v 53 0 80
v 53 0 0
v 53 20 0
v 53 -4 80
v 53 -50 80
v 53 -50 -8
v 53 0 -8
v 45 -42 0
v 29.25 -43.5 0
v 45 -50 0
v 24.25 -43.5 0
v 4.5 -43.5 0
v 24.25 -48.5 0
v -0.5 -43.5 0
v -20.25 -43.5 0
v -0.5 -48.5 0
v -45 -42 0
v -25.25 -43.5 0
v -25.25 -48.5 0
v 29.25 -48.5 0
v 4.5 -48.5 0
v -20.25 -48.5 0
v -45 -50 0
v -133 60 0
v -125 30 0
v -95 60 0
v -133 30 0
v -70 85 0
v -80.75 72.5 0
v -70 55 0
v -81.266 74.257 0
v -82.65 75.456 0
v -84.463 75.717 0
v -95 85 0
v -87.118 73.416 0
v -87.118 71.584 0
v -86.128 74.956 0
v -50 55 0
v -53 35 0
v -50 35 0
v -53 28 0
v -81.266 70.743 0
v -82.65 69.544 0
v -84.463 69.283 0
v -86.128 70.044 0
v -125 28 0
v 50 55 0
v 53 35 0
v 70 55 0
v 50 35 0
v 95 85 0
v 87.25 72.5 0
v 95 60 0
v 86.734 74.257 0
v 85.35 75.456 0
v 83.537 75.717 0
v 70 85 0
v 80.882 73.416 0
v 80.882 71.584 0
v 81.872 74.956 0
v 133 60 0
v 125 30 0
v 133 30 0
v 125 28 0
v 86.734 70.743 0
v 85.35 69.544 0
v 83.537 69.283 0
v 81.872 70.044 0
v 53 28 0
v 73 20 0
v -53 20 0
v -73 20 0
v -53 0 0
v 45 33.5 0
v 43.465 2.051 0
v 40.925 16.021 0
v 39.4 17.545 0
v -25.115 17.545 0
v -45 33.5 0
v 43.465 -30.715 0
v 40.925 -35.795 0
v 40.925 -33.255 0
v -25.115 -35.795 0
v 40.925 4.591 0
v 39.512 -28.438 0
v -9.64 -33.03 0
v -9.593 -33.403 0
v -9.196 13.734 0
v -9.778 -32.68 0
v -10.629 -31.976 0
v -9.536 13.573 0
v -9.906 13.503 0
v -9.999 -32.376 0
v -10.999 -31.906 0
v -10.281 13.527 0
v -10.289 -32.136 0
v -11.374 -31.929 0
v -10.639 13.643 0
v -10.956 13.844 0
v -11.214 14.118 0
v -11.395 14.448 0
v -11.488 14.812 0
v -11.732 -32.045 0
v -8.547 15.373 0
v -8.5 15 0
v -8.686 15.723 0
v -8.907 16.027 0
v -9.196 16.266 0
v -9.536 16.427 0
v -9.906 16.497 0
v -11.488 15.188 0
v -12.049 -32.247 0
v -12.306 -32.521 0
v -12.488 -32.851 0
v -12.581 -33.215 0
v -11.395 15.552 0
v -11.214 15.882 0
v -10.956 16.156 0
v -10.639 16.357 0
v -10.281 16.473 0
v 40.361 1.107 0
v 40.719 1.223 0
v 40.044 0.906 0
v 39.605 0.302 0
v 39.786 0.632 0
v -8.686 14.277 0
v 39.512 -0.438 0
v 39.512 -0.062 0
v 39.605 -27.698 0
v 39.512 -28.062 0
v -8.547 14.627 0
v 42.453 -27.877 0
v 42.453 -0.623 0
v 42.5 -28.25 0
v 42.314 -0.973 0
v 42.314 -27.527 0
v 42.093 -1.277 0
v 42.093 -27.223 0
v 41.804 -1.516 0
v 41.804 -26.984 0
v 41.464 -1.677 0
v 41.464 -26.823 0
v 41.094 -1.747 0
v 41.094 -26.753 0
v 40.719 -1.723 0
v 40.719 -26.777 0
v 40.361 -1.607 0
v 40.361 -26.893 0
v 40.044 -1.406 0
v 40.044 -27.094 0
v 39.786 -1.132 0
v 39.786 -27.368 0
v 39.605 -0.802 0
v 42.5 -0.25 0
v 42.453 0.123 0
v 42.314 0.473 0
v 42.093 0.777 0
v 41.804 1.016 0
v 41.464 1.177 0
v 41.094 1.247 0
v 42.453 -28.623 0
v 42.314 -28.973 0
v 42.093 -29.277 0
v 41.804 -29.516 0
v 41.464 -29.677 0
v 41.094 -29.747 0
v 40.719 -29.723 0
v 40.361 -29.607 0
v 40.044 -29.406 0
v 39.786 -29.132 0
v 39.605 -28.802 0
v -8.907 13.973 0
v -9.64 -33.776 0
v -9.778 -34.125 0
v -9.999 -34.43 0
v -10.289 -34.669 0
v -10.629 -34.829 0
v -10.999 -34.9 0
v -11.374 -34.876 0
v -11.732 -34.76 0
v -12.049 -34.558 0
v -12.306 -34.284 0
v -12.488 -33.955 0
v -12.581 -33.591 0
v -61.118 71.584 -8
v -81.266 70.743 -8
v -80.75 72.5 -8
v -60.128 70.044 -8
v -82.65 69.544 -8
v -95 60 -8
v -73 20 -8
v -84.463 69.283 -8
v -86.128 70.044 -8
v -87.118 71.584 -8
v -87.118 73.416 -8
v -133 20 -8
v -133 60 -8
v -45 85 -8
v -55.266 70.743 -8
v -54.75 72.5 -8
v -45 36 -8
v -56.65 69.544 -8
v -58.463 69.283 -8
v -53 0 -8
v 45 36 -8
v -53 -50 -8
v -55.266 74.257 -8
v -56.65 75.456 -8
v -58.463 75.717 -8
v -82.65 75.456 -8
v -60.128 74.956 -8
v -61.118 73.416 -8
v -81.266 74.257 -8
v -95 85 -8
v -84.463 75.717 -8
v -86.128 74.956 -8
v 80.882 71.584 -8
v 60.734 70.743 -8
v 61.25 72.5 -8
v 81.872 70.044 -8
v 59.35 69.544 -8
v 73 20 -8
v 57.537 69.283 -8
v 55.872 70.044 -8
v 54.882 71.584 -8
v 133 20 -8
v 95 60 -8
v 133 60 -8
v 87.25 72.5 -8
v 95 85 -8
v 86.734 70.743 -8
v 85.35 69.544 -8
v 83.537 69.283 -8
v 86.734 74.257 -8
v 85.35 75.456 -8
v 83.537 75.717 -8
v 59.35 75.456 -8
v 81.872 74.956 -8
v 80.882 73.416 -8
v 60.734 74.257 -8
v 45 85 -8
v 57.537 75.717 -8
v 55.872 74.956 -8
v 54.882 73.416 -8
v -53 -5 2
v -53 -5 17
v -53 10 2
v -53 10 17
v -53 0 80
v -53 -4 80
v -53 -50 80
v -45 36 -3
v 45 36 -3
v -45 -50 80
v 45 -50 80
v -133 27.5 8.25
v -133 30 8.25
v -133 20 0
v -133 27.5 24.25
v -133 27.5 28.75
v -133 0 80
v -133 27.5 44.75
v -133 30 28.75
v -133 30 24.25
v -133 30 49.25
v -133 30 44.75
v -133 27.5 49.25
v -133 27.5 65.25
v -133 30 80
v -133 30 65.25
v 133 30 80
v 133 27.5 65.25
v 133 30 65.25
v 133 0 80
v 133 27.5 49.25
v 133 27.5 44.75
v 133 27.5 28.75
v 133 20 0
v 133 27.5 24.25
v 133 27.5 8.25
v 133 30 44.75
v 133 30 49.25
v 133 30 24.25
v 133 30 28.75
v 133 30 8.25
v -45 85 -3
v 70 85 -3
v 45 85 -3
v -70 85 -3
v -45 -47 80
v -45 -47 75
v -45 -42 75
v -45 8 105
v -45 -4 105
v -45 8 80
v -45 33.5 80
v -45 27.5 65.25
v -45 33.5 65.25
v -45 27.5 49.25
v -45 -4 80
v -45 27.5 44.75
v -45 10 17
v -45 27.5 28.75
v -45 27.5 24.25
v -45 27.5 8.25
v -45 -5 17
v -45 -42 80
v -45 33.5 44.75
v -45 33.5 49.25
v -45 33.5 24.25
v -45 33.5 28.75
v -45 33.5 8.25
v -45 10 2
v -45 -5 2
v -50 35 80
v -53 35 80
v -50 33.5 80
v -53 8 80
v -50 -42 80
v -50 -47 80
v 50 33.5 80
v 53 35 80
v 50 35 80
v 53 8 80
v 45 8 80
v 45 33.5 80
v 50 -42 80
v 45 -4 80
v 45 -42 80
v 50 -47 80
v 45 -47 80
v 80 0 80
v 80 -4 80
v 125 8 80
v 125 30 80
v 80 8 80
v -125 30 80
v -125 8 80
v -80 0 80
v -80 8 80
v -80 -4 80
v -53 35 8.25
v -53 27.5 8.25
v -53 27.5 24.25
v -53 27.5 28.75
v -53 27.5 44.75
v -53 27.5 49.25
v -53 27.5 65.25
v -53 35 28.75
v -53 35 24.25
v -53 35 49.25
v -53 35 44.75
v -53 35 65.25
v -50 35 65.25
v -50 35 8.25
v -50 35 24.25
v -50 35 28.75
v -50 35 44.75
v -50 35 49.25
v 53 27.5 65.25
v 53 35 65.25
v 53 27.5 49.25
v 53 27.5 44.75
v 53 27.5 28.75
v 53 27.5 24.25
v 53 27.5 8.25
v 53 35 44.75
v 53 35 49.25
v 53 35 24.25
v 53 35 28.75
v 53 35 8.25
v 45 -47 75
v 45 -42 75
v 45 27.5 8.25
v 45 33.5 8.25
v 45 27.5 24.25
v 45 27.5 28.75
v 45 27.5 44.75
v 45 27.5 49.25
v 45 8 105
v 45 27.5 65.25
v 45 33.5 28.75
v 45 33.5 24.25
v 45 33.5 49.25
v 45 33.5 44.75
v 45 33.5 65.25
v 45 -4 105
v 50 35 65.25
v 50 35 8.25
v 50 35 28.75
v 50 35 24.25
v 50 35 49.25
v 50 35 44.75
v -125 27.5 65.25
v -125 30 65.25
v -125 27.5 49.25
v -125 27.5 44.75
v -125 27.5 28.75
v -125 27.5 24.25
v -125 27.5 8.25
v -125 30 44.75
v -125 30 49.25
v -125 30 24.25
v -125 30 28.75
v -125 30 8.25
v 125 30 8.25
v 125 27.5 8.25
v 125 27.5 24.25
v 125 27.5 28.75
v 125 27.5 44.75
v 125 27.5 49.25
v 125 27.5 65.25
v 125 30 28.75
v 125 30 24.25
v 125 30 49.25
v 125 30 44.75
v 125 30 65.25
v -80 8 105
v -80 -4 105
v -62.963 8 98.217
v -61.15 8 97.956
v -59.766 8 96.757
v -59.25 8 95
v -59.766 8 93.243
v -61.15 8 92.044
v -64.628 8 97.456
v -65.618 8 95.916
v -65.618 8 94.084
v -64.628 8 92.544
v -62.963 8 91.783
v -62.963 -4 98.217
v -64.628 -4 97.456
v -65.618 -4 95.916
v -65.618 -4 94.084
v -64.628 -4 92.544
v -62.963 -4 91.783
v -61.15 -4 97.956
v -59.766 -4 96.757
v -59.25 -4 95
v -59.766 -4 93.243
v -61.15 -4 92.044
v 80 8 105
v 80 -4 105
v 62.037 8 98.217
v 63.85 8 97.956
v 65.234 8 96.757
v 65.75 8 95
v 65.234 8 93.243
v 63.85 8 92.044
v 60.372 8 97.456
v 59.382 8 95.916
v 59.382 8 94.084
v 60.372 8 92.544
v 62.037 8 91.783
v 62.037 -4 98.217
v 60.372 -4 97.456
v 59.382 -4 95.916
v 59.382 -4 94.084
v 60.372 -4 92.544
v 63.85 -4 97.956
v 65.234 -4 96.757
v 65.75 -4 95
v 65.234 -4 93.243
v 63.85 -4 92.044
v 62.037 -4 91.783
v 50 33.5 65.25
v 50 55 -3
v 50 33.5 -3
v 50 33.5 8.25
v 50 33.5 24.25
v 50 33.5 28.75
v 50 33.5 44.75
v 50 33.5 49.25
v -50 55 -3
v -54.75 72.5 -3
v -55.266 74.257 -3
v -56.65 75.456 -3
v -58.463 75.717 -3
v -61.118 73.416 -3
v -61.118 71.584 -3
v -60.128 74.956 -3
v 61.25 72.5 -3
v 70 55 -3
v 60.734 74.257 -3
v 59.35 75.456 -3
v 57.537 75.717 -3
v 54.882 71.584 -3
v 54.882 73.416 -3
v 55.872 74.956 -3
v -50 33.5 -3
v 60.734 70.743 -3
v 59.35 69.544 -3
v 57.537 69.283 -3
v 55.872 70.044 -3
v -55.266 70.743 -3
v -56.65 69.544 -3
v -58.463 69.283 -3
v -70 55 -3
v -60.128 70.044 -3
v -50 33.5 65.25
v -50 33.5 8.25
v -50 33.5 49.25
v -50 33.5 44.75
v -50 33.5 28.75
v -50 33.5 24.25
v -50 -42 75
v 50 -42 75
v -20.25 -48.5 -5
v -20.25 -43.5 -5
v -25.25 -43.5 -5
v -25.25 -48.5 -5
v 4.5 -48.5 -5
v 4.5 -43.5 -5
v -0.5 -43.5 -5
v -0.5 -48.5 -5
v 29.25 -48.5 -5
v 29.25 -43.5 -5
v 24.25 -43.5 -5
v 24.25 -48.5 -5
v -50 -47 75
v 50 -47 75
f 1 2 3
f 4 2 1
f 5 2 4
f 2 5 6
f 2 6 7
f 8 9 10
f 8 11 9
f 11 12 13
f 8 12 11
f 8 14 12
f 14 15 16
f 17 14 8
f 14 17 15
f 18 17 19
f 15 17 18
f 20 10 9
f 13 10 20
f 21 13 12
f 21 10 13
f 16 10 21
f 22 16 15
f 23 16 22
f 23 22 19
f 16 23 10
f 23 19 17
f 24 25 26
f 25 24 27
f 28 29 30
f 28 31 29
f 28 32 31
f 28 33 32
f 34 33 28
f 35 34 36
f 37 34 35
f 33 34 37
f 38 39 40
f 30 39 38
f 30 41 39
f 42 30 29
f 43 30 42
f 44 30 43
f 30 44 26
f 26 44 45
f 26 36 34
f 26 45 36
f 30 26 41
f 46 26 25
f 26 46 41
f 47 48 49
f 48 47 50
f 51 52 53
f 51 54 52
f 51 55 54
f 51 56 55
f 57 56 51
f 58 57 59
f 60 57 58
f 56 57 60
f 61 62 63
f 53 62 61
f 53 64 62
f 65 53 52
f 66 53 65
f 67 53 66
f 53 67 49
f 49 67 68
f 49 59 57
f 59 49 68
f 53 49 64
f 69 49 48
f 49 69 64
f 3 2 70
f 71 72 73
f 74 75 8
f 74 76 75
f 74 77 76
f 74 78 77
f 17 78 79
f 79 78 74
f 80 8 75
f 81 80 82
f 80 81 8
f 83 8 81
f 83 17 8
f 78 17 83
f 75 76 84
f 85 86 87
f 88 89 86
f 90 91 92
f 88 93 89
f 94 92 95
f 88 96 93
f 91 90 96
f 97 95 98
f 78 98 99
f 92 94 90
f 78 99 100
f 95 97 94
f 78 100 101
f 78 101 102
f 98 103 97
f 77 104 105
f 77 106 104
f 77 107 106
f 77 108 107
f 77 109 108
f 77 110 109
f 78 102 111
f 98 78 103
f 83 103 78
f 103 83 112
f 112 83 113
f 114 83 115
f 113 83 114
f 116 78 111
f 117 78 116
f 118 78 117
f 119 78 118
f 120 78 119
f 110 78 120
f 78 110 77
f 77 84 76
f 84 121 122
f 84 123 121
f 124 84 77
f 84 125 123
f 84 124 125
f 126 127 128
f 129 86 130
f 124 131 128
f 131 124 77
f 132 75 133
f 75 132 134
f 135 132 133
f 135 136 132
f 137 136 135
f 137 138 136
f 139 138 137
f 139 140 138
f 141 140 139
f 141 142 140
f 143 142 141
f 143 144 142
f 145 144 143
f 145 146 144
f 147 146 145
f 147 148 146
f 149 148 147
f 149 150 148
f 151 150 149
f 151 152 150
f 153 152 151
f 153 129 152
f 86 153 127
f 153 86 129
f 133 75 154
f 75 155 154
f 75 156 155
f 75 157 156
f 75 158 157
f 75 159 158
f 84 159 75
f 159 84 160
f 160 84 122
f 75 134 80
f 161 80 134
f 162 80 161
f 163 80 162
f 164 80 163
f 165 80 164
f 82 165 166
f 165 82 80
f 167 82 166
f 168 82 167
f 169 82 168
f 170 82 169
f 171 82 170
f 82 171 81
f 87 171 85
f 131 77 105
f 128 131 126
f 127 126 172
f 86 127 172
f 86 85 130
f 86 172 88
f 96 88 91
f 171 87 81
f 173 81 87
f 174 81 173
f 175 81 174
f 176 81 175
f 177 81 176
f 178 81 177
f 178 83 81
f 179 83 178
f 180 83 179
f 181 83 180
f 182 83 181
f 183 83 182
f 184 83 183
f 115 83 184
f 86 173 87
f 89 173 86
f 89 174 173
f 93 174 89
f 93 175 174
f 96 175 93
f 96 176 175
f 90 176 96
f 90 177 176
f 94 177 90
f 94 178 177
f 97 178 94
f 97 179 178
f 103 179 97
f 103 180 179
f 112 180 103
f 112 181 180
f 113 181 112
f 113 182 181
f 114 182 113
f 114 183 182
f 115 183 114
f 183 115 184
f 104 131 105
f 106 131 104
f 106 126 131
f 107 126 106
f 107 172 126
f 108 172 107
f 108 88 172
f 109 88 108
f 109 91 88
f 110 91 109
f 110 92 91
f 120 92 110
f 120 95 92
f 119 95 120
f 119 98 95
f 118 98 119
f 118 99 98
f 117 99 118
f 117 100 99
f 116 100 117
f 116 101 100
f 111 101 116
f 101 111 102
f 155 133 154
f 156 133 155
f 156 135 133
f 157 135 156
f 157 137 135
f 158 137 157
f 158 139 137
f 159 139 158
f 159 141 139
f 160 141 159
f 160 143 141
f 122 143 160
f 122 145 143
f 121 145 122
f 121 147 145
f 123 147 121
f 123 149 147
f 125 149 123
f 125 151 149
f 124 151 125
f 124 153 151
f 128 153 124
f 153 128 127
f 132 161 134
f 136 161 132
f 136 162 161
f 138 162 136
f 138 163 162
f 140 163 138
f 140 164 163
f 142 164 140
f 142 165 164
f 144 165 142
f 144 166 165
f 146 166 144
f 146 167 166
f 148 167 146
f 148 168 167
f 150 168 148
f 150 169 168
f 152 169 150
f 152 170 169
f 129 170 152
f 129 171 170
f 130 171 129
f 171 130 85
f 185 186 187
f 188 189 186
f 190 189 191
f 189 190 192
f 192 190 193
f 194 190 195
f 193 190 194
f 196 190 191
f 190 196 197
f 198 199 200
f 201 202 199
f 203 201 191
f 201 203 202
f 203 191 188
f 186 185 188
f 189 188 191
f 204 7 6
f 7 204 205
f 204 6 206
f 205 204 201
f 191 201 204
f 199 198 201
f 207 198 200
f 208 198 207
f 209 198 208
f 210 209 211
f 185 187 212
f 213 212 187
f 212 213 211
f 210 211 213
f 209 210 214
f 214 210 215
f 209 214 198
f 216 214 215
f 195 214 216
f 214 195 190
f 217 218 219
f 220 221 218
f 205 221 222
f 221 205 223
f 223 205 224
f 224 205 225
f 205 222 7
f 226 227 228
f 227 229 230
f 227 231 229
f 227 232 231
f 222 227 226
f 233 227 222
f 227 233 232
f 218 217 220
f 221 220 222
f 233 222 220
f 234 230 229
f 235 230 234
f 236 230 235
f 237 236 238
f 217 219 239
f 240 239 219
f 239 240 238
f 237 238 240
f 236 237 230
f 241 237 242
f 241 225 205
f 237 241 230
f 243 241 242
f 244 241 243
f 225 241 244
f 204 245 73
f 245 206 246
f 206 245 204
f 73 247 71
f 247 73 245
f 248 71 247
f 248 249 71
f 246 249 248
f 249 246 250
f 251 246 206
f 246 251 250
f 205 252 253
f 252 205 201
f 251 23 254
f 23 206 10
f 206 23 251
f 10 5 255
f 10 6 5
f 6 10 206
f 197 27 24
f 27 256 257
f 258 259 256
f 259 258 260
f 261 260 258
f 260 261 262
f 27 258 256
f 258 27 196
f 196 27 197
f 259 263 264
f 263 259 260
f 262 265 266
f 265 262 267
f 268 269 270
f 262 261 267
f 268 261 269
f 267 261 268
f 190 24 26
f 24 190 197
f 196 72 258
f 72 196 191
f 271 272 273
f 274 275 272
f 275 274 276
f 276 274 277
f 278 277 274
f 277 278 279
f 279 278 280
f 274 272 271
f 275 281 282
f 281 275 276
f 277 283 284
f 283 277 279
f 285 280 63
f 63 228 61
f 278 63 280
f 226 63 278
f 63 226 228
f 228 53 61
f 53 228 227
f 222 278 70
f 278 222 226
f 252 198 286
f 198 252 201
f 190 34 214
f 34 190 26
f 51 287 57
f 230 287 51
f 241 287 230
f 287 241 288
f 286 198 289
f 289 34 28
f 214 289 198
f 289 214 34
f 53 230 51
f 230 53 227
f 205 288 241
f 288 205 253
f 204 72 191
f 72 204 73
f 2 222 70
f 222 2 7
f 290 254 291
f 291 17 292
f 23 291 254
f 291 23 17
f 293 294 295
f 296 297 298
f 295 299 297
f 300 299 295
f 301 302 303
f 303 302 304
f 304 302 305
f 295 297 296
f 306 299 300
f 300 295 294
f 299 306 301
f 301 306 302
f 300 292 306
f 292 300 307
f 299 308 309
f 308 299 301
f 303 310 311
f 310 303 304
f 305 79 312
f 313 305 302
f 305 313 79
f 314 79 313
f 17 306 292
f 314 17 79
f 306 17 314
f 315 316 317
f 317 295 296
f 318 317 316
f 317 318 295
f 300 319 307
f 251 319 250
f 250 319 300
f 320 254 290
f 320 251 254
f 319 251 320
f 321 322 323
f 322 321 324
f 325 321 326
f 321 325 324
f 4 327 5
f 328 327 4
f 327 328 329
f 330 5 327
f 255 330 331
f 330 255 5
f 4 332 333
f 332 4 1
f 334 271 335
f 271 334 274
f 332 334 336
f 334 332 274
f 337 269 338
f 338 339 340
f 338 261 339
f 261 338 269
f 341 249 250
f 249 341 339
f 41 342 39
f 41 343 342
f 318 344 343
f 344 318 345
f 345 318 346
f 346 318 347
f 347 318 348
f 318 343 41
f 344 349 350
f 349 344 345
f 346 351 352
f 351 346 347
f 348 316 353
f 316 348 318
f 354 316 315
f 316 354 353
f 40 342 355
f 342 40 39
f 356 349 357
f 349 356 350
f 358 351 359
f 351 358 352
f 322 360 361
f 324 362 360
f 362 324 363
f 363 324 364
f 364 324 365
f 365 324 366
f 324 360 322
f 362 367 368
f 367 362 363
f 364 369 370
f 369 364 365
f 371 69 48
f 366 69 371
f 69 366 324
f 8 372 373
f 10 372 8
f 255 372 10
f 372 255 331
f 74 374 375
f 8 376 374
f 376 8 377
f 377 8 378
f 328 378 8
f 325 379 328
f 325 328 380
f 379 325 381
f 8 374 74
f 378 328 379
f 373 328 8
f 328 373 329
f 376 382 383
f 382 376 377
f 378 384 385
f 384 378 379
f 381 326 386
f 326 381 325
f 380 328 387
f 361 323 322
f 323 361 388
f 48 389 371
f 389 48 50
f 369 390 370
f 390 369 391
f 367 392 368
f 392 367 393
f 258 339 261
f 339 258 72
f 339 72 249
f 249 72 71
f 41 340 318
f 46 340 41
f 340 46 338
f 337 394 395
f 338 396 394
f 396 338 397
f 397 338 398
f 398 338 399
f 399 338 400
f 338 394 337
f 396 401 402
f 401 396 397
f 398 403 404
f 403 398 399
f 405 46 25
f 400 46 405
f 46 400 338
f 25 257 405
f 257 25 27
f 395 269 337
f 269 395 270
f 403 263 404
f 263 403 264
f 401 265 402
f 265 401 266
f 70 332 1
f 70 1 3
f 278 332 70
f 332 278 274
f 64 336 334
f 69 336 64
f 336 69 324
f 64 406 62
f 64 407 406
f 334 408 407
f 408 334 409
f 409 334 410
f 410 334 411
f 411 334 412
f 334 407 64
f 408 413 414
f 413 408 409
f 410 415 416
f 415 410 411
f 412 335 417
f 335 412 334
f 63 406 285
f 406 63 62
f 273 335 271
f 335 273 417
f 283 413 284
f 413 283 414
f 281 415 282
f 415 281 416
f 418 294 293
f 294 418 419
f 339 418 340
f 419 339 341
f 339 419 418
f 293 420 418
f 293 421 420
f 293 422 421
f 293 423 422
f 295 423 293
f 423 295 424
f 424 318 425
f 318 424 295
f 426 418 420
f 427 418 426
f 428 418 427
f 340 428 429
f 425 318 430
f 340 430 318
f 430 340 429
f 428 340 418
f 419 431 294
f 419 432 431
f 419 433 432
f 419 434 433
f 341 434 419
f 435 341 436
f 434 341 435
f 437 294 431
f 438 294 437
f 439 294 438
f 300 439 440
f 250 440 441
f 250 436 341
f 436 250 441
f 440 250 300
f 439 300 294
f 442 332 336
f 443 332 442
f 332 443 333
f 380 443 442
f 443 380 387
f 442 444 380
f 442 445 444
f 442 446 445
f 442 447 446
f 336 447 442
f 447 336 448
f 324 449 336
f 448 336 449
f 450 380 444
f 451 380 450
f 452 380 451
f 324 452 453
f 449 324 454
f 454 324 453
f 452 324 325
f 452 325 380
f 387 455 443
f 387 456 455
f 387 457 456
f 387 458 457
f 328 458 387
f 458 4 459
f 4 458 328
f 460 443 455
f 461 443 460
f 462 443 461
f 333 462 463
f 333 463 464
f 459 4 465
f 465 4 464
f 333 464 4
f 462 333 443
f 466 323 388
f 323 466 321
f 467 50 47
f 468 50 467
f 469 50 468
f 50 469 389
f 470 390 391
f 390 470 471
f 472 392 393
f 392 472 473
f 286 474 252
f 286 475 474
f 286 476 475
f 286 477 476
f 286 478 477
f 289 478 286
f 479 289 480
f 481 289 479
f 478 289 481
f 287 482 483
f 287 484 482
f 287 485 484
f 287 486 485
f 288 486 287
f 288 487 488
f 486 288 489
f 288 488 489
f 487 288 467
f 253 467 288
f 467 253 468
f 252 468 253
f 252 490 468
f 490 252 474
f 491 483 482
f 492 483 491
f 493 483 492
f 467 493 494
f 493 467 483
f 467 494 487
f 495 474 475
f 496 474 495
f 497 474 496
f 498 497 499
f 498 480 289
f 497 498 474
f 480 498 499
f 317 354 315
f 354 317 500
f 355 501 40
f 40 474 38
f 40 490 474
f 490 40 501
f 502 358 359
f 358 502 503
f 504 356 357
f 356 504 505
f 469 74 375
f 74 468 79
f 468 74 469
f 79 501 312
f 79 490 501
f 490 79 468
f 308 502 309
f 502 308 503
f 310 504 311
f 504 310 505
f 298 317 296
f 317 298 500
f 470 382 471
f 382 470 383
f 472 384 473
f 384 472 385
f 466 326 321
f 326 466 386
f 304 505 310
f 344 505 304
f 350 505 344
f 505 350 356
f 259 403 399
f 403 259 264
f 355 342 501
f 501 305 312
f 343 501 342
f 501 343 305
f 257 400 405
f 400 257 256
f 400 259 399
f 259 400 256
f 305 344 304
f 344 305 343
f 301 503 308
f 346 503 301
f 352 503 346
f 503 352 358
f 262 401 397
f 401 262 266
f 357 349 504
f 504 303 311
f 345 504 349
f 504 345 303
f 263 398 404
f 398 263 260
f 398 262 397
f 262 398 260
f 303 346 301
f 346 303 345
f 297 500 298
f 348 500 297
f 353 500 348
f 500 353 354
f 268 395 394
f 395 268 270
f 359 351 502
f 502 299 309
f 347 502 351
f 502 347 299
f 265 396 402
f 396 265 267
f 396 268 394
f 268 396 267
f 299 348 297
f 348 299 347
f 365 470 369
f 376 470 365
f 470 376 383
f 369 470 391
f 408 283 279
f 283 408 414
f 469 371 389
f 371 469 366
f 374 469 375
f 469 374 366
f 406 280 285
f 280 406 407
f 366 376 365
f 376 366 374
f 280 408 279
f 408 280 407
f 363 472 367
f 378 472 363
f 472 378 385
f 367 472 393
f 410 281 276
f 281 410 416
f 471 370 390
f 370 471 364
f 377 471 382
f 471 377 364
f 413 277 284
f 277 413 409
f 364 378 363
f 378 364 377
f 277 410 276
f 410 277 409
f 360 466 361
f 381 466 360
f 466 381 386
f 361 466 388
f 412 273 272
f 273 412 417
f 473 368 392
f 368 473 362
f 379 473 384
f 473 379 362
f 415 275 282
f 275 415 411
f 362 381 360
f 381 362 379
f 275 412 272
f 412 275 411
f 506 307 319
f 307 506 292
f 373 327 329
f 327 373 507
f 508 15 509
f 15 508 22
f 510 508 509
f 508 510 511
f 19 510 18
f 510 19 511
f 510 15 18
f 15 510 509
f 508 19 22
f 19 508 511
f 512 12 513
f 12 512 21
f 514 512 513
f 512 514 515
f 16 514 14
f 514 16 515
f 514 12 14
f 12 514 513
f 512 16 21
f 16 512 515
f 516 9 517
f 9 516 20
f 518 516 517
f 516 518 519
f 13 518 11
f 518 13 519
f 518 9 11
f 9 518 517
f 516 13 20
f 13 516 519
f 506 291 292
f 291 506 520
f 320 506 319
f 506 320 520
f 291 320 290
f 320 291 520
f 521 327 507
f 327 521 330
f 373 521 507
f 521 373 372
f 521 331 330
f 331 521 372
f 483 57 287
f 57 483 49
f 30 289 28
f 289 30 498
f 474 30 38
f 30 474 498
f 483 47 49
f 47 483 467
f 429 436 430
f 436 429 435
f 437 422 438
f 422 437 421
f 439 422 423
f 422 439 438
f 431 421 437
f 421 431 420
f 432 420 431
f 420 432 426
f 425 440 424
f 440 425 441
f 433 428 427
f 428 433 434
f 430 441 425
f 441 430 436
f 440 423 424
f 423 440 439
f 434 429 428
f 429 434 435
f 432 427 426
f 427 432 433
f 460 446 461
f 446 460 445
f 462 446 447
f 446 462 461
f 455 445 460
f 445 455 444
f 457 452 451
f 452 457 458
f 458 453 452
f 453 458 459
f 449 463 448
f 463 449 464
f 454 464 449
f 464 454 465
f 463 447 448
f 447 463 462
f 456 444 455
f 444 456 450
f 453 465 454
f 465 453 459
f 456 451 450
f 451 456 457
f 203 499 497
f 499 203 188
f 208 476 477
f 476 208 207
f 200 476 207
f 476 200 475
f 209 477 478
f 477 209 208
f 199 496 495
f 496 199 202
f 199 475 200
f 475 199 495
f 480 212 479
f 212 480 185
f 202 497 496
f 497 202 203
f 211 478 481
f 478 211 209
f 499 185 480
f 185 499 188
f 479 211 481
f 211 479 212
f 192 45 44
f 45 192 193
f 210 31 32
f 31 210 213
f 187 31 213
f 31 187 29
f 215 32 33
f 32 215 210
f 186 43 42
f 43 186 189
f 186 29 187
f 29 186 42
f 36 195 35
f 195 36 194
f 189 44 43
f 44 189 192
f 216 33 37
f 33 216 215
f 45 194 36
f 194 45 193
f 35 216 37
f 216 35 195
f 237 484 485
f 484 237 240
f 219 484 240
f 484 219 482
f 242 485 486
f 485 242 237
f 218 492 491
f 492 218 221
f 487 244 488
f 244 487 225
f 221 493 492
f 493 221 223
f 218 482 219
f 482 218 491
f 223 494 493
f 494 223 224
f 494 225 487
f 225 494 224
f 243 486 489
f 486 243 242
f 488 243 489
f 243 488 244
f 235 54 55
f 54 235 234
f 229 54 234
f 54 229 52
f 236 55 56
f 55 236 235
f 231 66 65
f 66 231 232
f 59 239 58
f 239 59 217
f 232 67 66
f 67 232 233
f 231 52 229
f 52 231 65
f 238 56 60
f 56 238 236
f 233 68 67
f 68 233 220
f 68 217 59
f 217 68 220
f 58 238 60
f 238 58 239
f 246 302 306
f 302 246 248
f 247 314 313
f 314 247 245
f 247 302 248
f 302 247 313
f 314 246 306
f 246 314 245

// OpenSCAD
//
//if (accessories=="ON"){
//	color([222/255,184/255,135/255]) translate([-50,33.5,-3]) board();
//	translate([-10,15,0]) Arduino(0,0,0);
//} 
//if (mode=="EXPLODED"){
//	baseWCuts();
//	translate([-45,-80,30]) backDoor();
//	translate([0,30,30]) frontPanel();
//	translate([0,30,30]) mirror([1,0,0]) frontPanel();
//}
//if (mode=="ASSEMBLED"){
//	baseWCuts();
//	translate([-45,-50,0]) backDoor();
//	frontPanel();
//	mirror([1,0,0]) frontPanel();
//}
//if (mode=="PARTS"){
//	baseWCuts();
//	translate([280,-10,40]) rotate([270,0,0]) frontPanel();
//	translate([-250,0,10]) rotate([270,0,0]) backDoor();
//	translate([230,-10,40]) mirror([1,0,0]) rotate([270,0,0]) frontPanel();
//
//}

baseWCuts();

//
///////////////////////////////
/* MAIN CONSTRUCTOR MODULES */
//////////////////////////////


//Creates exact front panel with cuts using frontPanelBasic()
module frontPanel(){ 
	difference(){
		translate([-126.5,52,0]) frontPanelBasic();
		baseWCuts();
		translate([-50,33.5,-3]) board();
		translate([65,10,95]) rotate([90,0,0]) cylinder(r=6.5,h=20);
		translate([-58,72.5,-10]) cylinder(r=3.25,h=20);//cuts panel screw holes
		translate([-84,72.5,-10]) cylinder(r=3.25,h=20);
	}
}

//Creates basic block front panel without cuts
module frontPanelBasic(){ 
	union(){
		cube([81.5,8,80]);
		translate([31.5,0,-3]) cube([50,33,8]);
		translate([73.5,-20,-5]) cube([8,20,85]);
		translate([-6.5,-23,0]) cube([8,31,80]);
	}
}

//Creates full base with sides, floor, and all necessary cuts
module baseWCuts(){
	difference(){
		base();
		translate([-50,33.5,-3]) board(); //cuts board
		translate([-10,15,0]) Arduino(0,0,0); //cuts arduino
		translate([-45,-50,0]) backDoor(); //cuts back door
		translate([-70,55,-3]) cube([140,30,3]); //cuts indent in prongs
		translate([-62.5,10,95]) rotate([90,0,0]) cylinder(r=3.25,h=20); //cuts hanger
		translate([62.5,10,95]) rotate([90,0,0]) cylinder(r=3.25,h=20);
		translate([-58,72.5,-10]) cylinder(r=3.25,h=20);//cuts panel screw holes
		translate([-84,72.5,-10]) cylinder(r=3.25,h=20);
		translate([58,72.5,-10]) cylinder(r=3.25,h=20);
		translate([84,72.5,-10]) cylinder(r=3.25,h=20);
		translate([-53,-5,2]) cube([15,15,15]); //cuts arduino extension port
		translate([-50,36.5,-3]) cube([100,20,3]);
	}
}

//Creates simple base with floor and sides
module base(){
	union(){
		translate([-53,-50,-8]) floor();
		translate([-53,-50,0]) sides();
		translate([-80,-4,80]) cube([35,12,25]); //creates top hinges 
		translate([45,-4,80]) cube([35,12,25]);
	}
}

//Creates back door that will fit into slots in the base.
module backDoor(){
	union(){
		cube([90,8,80]);
	
		translate([19.75,1.5,-5]) cube([5,5,5]); //bottom notches
		translate([44.5,1.5,-5]) cube([5,5,5]);
		translate([69.25,1.5,-5]) cube([5,5,5]);
	
		translate([-5,3,75]) cube([5,5,5]);//top notches
		translate([90,3,75]) cube([5,5,5]);
	
		translate([23,0,40]) rotate([90,0,0]) scale([1,1,1.5]) drawtext("metaLab."); //text
	}
}

//Creates walls including slants
module sides(){

	cube([8,85,80]);
	translate([98,0,0]) cube([8,85,80]);
	translate([-80,70,0]) slant();
	translate([186,70,0]) mirror([1,0,0]) slant();

}

//creates slanted L shaped wall
module slant(){
	polyhedron(
	points = [ [0,0,0],[80,0,0],[0,10,0],[8,10,0],[8,8,0], [80,8,0],
				[0,-20,80],[80,-20,80],[0,10,80],[8,10,80],[8,-12,80],
				[80,-12,80] ],

	faces = [ [0,1,5,4,3,2] ,[6,8,9,10,11,7], [2,8,6,0],
				[0,6,7,1], [1,7,11,5], [5,11,10,4], [4,10,9,3],
				[3,9,8,2]]


	);
}

//Creates floor of the enclosure
module floor(){
	union(){
		cube([106,86,8]);
		
		translate([-80,70,0]) cube([80,40,8]);//wings
		translate([106,70,0]) cube([80,40,8]);
	
		translate([-42,85,0]) cube([50,50,8]); //prongs
		translate([98,85,0]) cube([50,50,8]);
		diagonal();
		translate([106,0,0]) mirror([1,0,0]) diagonal();
	}
}

//Creates triangle inlet for floor
module diagonal(){
	polyhedron(
		points = [ [0,50,0],[0,70,0],[-20,70,0],[0,50,8],[0,70,8],[-20,70,8]],
		faces = [ [2,1,0],[3,4,5],[2,0,3,5],[0,1,4,3],[1,2,5,4] ]
	);
}

//Models enclosed circuit board
module board(){
	union(){
		cube([100,3,85]);
		translate([-87.5,-6,11.25]) cube([95,16,16]);//left
		translate([-87.5,-6,31.75]) cube([95,16,16]);
		translate([-87.5,-6,52.25]) cube([95,16,16]);
	
		translate([92.5,-6,11.25]) cube([95,16,16]);//right
		translate([92.5,-6,31.75]) cube([95,16,16]);
		translate([92.5,-6,52.25]) cube([95,16,16]);
	}
}

/////////////////////////
//TEXT DRAWING MODULES//
////////////////////////
//You can ignore these//

module drawtext(text) {
	//Characters
	chars = " !\"#$%&'()*+,-./0123456789:;<=>?@ABCDEFGHIJKLMNOPQRSTUVWXYZ[\\]^_`abcdefghijklmnopqrstuvwxyz{|}";

	//Chracter table defining 5x7 characters
	//Adapted from: http://www.geocities.com/dinceraydin/djlcdsim/chartable.js
	char_table = [ [ 0, 0, 0, 0, 0, 0, 0],
                  [ 4, 0, 4, 4, 4, 4, 4],
                  [ 0, 0, 0, 0,10,10,10],
                  [10,10,31,10,31,10,10],
                  [ 4,30, 5,14,20,15, 4],
                  [ 3,19, 8, 4, 2,25,24],
                  [13,18,21, 8,20,18,12],
                  [ 0, 0, 0, 0, 8, 4,12],
                  [ 2, 4, 8, 8, 8, 4, 2],
                  [ 8, 4, 2, 2, 2, 4, 8],
                  [ 0, 4,21,14,21, 4, 0],
                  [ 0, 4, 4,31, 4, 4, 0],
                  [ 8, 4,12, 0, 0, 0, 0],
                  [ 0, 0, 0,31, 0, 0, 0],
                  [12,12, 0, 0, 0, 0, 0],
                  [ 0,16, 8, 4, 2, 1, 0],
                  [14,17,25,21,19,17,14],
                  [14, 4, 4, 4, 4,12, 4],
                  [31, 8, 4, 2, 1,17,14],
                  [14,17, 1, 2, 4, 2,31],
                  [ 2, 2,31,18,10, 6, 2],
                  [14,17, 1, 1,30,16,31],
                  [14,17,17,30,16, 8, 6],
                  [ 8, 8, 8, 4, 2, 1,31],
                  [14,17,17,14,17,17,14],
                  [12, 2, 1,15,17,17,14],
                  [ 0,12,12, 0,12,12, 0],
                  [ 8, 4,12, 0,12,12, 0],
                  [ 2, 4, 8,16, 8, 4, 2],
                  [ 0, 0,31, 0,31, 0, 0],
                  [16, 8, 4, 2, 4, 8,16],
                  [ 4, 0, 4, 2, 1,17,14],
                  [14,21,21,13, 1,17,14],
                  [17,17,31,17,17,17,14],
                  [30,17,17,30,17,17,30],
                  [14,17,16,16,16,17,14],
                  [30,17,17,17,17,17,30],
                  [31,16,16,30,16,16,31],
                  [16,16,16,30,16,16,31],
                  [15,17,17,23,16,17,14],
                  [17,17,17,31,17,17,17],
                  [14, 4, 4, 4, 4, 4,14],
                  [12,18, 2, 2, 2, 2, 7],
                  [17,18,20,24,20,18,17],
                  [31,16,16,16,16,16,16],
                  [17,17,17,21,21,27,17],
                  [17,17,19,21,25,17,17],
                  [14,17,17,17,17,17,14],
                  [16,16,16,30,17,17,30],
                  [13,18,21,17,17,17,14],
                  [17,18,20,30,17,17,30],
                  [30, 1, 1,14,16,16,15],
                  [ 4, 4, 4, 4, 4, 4,31],
                  [14,17,17,17,17,17,17],
                  [ 4,10,17,17,17,17,17],
                  [10,21,21,21,17,17,17],
                  [17,17,10, 4,10,17,17],
                  [ 4, 4, 4,10,17,17,17],
                  [31,16, 8, 4, 2, 1,31],
                  [14, 8, 8, 8, 8, 8,14],
                  [ 0, 1, 2, 4, 8,16, 0],
                  [14, 2, 2, 2, 2, 2,14],
                  [ 0, 0, 0, 0,17,10, 4],
                  [31, 0, 0, 0, 0, 0, 0],
                  [ 0, 0, 0, 0, 2, 4, 8],
                  [15,17,15, 1,14, 0, 0],
                  [30,17,17,25,22,16,16],
                  [14,17,16,16,14, 0, 0],
                  [15,17,17,19,13, 1, 1],
                  [14,16,31,17,14, 0, 0],
                  [ 8, 8, 8,28, 8, 9, 6],
                  [14, 1,15,17,15, 0, 0],
                  [17,17,17,25,22,16,16],
                  [14, 4, 4, 4,12, 0, 4],
                  [12,18, 2, 2, 2, 6, 2],
                  [18,20,24,20,18,16,16],
                  [14, 4, 4, 4, 4, 4,12],
                  [17,17,21,21,26, 0, 0],
                  [17,17,17,25,22, 0, 0],
                  [14,17,17,17,14, 0, 0],
                  [16,16,30,17,30, 0, 0],
                  [ 1, 1,15,19,13, 0, 0],
                  [16,16,16,25,22, 0, 0],
                  [30, 1,14,16,15, 0, 0],
                  [ 6, 9, 8, 8,28, 8, 8],
                  [13,19,17,17,17, 0, 0],
                  [ 4,10,17,17,17, 0, 0],
                  [10,21,21,17,17, 0, 0],
                  [17,10, 4,10,17, 0, 0],
                  [14, 1,15,17,17, 0, 0],
                  [31, 8, 4, 2,31, 0, 0],
                  [ 2, 4, 4, 8, 4, 4, 2],
                  [ 4, 4, 4, 4, 4, 4, 4],
                  [ 8, 4, 4, 2, 4, 4, 8] ];

	//Binary decode table
	dec_table = [ "00000", "00001", "00010", "00011", "00100", "00101",
  	            "00110", "00111", "01000", "01001", "01010", "01011",
  	            "01100", "01101", "01110", "01111", "10000", "10001",
  	            "10010", "10011", "10100", "10101", "10110", "10111",
	            "11000", "11001", "11010", "11011", "11100", "11101",
	            "11110", "11111" ];

	//Process string one character at a time
	for(itext = [0:len(text)-1]) {
		//Convert character to index
		assign(ichar = search(text[itext],chars,1)[0]) {
			//Decode character - rows
			for(irow = [0:6]) {
				assign(val = dec_table[char_table[ichar][irow]]) {
					//Decode character - cols
					for(icol = [0:4]) {
						assign(bit = search(val[icol],"01",1)[0]) {
							if(bit) {
								//Output cube
								translate([icol + (6*itext), irow, 0])
									cube([1.0001,1.0001,1]);
							}
						}
					}
				}
			}
		}
	}
}


////////////////////////////
//ARDUINO DRAWING MODULES//
///////////////////////////
//You can ignore these//

board_height = 4;

module Arduino(solid_holes, combined_headers, extend_ports)
{
	echo(str("solid_holes: ", solid_holes));
	echo(str("combined_headers: ", combined_headers));
	echo(str("extend_ports: ", extend_ports));

	if (solid_holes == 1)
	{
		echo("solid holes");
		union()
		{
			Board();
			USB(extend_ports);
			PowerPlug(extend_ports);
			FemaleHeaders(combined_headers);
			MaleHeaders();
			ResetButton();
			ATMega();
			MountingHoles();
		}
	}
	else
	{
		echo("regular holes");
		difference()
		{
			union()
			{
				Board();
				USB(extend_ports);
				PowerPlug(extend_ports);
				FemaleHeaders(combined_headers);
				MaleHeaders();
				ResetButton();
				ATMega();
			}
			MountingHoles();
		}
	}
}

module ResetButton()
{
	translate([39, -26, board_height])
	{
		color([0.8, 0.8, 0.8])
		cube([6, 6, 2.2]);
		
		color([0.6, 0.4, 0.2])
		translate([3, 3, 0]) cylinder(r=1.4, h=3.5, $fn=25);
	}
}

module MaleHeaders()
{
	color([0.6, 0.6, 0.6])
	translate([0, 0, board_height])
	{
		translate([0, -7, 0]) cube([7, 5, 9.2]);
		translate([47.5, -26, 0]) cube([5, 7, 9.2]);
	}
}

module ATMega()
{
	color([0.3, 0.3, 0.3])
	translate([14, -39, board_height])
	{
		cube([35.5, 10, 7.5]);
	}
}

module FemaleHeaders(combined)
{
	color([0.3, 0.3, 0.3])
	translate([0, 0, board_height])
	{
		translate([0, -1, 0])
		{
			translate([7, 0, 0])
			{
				if(combined == 1)
				{
					cube([43, 2, 8.2]);
				}
				else
				{
					cube([21, 2, 8.2]);
					translate([22, 0, 0]) cube([21, 2, 8.2]);
				}
			}
		}

		translate([0, -50, 0])
		{
			translate([17, 0, 0])
			{
				if(combined == 1)
				{
					cube([33, 2, 8.2]);
				}
				else
				{
					cube([15.5, 2, 8.2]);
					translate([17.5, 0, 0]) cube([15.5, 2, 8.2]);
				}
			}
		}
	}
}

module PowerPlug(extended)
{
	if(extended == 1)
	{
		translate([-26.893, -47.4929962, board_height])
		color([0.3, 0.3, 0.3])
		cube([24, 9, 11]);
	}
	else
	{
		translate([-16.893, -47.4929962, board_height])
		color([0.3, 0.3, 0.3])
		cube([14, 9, 11]);
	}
}

module USB(extended)
{
	if(extended == 1)
	{
		translate([-31.465, -18.5623962, board_height])
		color([0.8, 0.8, 0.8])
		cube([26, 12, 11]);
	}
	else
	{
		translate([-61.465, -18.5623962, board_height])
		color([0.8, 0.8, 0.8])
		cube([56, 12, 11]);
	}
}


module Board()
{
	color([0, 0.6, 0.8])
	linear_extrude(height = board_height, convexity = 10, twist = 0)
	{
		polygon( points = [ [-15.115, 2.545],
						[49.4, 2.545],
						[50.925, 1.021],
						[50.925, -10.409],
						[53.465, -12.949],
						[53.465, -45.715],
						[50.925, -48.255],
						[50.925, -50.795],
						[-15.115, -50.795] ],
				paths = [[0, 1, 2, 3, 4, 5, 6, 7, 8]],
				convexity = 10);
	}
}

module MountingHoles()
{
	translate([0, 0, -10])
	{
		ArduinoHole(25);
		translate([-1.0929112, -48.4026972, 0]) ArduinoHole(25);
		translate([51, -15.25, 0]) ArduinoHole(25);
		translate([51, -43.25, 0]) ArduinoHole(25);
	}
}

module ArduinoHole(length)
{
	color([0.7, 0.7, 0.7])
	cylinder(r=1.5, h=length, $fn=25);
}
